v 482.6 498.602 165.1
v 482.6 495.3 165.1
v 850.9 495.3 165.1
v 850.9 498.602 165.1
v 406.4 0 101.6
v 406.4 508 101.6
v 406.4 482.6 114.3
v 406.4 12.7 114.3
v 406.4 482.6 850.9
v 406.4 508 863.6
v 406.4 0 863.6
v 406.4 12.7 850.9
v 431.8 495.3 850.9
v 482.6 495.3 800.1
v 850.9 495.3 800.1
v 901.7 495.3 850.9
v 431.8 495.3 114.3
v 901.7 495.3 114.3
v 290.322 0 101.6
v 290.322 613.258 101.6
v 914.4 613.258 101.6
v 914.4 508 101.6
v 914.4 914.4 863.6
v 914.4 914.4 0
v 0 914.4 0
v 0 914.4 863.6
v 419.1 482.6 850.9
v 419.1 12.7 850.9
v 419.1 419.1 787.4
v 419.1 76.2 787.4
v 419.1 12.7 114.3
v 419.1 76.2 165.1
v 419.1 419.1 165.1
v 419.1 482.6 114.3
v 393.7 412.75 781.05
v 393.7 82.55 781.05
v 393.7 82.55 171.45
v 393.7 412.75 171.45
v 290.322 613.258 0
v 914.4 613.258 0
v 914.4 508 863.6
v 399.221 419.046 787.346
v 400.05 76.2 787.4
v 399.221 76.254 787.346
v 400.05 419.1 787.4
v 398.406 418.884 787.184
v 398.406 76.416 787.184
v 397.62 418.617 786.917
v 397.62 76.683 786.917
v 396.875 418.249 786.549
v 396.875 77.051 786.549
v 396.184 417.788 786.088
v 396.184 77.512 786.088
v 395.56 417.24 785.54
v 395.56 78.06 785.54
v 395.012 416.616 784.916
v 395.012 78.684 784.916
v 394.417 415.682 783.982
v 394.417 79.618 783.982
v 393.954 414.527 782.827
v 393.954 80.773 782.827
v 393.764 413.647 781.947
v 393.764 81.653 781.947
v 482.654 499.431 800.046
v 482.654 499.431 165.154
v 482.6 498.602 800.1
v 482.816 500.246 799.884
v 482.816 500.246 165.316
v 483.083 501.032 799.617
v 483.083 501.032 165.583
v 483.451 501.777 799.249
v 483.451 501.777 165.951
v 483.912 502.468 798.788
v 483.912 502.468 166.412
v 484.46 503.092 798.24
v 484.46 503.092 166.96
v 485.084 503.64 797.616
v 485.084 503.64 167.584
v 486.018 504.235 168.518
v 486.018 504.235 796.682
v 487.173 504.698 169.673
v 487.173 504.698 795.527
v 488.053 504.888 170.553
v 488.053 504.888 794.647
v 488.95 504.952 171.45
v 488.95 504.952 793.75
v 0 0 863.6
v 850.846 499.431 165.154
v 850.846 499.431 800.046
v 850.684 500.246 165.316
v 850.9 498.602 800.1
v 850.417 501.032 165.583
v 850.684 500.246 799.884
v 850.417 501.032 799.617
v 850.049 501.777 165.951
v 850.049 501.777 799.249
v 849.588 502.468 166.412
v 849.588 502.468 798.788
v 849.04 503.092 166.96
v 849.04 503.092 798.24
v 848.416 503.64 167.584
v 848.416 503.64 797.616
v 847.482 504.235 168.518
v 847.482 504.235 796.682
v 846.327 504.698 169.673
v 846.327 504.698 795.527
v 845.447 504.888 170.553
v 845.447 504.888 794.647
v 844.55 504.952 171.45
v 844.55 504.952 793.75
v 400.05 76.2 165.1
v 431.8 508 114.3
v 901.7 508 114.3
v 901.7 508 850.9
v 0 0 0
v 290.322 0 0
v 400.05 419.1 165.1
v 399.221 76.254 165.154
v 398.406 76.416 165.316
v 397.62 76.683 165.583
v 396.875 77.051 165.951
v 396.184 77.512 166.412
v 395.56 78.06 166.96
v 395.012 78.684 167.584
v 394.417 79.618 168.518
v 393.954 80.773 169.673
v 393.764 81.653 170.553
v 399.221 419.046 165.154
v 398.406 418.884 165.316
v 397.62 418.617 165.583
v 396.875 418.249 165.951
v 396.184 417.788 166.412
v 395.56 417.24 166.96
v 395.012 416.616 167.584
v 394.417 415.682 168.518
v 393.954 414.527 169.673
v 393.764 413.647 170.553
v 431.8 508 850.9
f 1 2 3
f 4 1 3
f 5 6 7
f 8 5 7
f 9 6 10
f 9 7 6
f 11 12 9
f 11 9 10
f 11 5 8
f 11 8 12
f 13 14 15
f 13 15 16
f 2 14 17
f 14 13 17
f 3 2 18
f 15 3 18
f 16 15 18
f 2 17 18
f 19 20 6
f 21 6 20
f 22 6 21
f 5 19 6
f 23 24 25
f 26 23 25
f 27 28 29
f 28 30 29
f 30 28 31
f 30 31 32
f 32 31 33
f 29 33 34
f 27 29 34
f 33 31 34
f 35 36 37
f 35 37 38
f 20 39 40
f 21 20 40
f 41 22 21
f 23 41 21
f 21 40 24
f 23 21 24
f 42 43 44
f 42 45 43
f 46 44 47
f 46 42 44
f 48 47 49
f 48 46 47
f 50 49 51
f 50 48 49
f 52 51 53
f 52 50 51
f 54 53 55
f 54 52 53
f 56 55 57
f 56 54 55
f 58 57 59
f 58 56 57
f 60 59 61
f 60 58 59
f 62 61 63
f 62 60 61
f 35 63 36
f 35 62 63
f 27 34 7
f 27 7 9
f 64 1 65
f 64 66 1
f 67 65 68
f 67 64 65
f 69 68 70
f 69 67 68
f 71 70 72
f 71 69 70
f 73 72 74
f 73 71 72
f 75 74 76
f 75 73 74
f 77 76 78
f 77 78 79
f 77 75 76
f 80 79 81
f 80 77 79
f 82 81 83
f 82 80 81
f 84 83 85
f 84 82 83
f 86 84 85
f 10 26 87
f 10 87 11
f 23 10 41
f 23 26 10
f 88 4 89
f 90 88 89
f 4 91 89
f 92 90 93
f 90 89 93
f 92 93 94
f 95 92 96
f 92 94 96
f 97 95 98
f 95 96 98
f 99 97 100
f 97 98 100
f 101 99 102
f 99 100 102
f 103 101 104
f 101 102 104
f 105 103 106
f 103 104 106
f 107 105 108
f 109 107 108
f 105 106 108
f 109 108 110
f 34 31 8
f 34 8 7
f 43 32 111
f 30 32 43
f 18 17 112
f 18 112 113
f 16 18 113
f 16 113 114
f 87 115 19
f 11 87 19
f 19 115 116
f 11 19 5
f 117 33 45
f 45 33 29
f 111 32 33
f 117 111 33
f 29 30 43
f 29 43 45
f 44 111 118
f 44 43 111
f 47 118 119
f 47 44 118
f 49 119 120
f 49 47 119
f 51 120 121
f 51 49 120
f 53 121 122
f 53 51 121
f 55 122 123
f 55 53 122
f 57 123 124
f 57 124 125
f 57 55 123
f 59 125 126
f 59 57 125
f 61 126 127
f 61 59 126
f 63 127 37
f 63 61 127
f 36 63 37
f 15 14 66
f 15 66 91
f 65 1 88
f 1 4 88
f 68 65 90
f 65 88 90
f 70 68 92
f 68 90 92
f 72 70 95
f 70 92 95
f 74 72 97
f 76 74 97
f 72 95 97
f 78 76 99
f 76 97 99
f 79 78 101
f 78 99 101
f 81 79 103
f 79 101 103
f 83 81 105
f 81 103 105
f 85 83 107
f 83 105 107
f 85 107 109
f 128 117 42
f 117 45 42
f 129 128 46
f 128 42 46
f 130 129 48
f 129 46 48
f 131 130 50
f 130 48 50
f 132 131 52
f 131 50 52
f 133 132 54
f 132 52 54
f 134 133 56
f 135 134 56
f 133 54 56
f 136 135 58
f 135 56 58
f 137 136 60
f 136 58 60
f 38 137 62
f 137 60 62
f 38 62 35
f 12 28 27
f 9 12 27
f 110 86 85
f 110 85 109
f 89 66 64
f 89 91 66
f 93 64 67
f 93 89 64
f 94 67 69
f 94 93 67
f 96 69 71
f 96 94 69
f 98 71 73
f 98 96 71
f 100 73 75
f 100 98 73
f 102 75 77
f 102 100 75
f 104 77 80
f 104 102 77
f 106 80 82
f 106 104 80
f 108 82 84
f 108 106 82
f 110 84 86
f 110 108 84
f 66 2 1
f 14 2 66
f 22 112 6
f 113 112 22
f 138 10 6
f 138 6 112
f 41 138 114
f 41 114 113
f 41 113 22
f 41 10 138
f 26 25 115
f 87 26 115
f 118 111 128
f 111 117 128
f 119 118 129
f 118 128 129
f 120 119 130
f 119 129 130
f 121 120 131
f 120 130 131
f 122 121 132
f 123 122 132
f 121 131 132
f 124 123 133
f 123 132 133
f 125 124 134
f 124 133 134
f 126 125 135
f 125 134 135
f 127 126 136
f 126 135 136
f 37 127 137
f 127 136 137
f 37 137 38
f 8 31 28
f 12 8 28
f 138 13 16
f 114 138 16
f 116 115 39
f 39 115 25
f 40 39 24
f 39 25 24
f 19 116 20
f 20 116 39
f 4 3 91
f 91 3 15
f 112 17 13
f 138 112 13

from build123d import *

# Parameters (mm, degrees)
F1_DEPTH  = 863.6
F2_W      = 342.9
F2_H      = 622.3
F3_DEPTH  = 25.4
F4_R      = 6.35
F5_W      = 368.3
F5_H      = 635
F6_DEPTH  = 9.652
F7_R      = 6.35
F9_DEPTH  = 101.6
F10_W     = 495.3
F10_H     = 762
F10_W_2   = 469.9
F10_H_2   = 736.6
F11_DEPTH = 12.7
F12_W     = 508
F12_H     = 762
F12_W_2   = 469.9
F12_H_2   = 736.6
F13_DEPTH = 12.7


with BuildPart() as f1:
    # F0 (on Top) → F1 (new body)
    with BuildSketch(Plane.XY):
        Polygon((0, 914.4), (0, 0), (419.1, 0), (419.1, 495.3), (914.4, 495.3), (914.4, 914.4), align=None)
    extrude(amount=F1_DEPTH)

    # F2 (on face) → F3 (cut)
    with BuildSketch(Plane.YZ.offset(419.1)):
        with Locations((247.65, 476.25)):
            Rectangle(F2_W, F2_H)
    extrude(amount=-F3_DEPTH, mode=Mode.SUBTRACT)

    # F4
    f4_edges = [f1.edges().sort_by_distance(p)[0] for p in [
        (393.7, 419.1, 476.25),
        (393.7, 247.65, 787.4),
        (393.7, 76.2, 476.25),
        (393.7, 247.65, 165.1),
    ]]
    fillet(f4_edges, radius=F4_R)

    # F5 (on face) → F6 (cut)
    with BuildSketch(Plane.XZ.offset(-495.3)):
        with Locations((666.75, 482.6)):
            Rectangle(F5_W, F5_H)
    extrude(amount=-F6_DEPTH, mode=Mode.SUBTRACT)

    # F7
    f7_edges = [f1.edges().sort_by_distance(p)[0] for p in [
        (850.9, 504.952, 482.6),
        (666.75, 504.952, 800.1),
        (482.6, 504.952, 482.6),
        (666.75, 504.952, 165.1),
    ]]
    fillet(f7_edges, radius=F7_R)

    # F8 (on face) → F9 (cut)
    with BuildSketch(Plane(origin=(0, 0, 0), x_dir=(1, 0, 0), z_dir=(0, 0, -1))):
        Polygon((419.1, -495.3), (419.1, 0), (290.321976, 0), (290.321976, -613.257587), (914.4, -613.257587), (914.4, -495.3), align=None)
    extrude(amount=-F9_DEPTH, mode=Mode.SUBTRACT)

    # F10 (on face) → F11 (cut)
    with BuildSketch(Plane.YZ.offset(419.1)):
        with Locations((247.65, 482.6)):
            Rectangle(F10_W, F10_H)
        with Locations((247.65, 482.6)):
            Rectangle(F10_W_2, F10_H_2, mode=Mode.SUBTRACT)
    extrude(amount=-F11_DEPTH, mode=Mode.SUBTRACT)

    # F12 (on face) → F13 (cut)
    with BuildSketch(Plane.XZ.offset(-495.3)):
        with Locations((660.4, 482.6)):
            Rectangle(F12_W, F12_H)
        with Locations((666.75, 482.6)):
            Rectangle(F12_W_2, F12_H_2, mode=Mode.SUBTRACT)
    extrude(amount=-F13_DEPTH, mode=Mode.SUBTRACT)


solid = f1.part
